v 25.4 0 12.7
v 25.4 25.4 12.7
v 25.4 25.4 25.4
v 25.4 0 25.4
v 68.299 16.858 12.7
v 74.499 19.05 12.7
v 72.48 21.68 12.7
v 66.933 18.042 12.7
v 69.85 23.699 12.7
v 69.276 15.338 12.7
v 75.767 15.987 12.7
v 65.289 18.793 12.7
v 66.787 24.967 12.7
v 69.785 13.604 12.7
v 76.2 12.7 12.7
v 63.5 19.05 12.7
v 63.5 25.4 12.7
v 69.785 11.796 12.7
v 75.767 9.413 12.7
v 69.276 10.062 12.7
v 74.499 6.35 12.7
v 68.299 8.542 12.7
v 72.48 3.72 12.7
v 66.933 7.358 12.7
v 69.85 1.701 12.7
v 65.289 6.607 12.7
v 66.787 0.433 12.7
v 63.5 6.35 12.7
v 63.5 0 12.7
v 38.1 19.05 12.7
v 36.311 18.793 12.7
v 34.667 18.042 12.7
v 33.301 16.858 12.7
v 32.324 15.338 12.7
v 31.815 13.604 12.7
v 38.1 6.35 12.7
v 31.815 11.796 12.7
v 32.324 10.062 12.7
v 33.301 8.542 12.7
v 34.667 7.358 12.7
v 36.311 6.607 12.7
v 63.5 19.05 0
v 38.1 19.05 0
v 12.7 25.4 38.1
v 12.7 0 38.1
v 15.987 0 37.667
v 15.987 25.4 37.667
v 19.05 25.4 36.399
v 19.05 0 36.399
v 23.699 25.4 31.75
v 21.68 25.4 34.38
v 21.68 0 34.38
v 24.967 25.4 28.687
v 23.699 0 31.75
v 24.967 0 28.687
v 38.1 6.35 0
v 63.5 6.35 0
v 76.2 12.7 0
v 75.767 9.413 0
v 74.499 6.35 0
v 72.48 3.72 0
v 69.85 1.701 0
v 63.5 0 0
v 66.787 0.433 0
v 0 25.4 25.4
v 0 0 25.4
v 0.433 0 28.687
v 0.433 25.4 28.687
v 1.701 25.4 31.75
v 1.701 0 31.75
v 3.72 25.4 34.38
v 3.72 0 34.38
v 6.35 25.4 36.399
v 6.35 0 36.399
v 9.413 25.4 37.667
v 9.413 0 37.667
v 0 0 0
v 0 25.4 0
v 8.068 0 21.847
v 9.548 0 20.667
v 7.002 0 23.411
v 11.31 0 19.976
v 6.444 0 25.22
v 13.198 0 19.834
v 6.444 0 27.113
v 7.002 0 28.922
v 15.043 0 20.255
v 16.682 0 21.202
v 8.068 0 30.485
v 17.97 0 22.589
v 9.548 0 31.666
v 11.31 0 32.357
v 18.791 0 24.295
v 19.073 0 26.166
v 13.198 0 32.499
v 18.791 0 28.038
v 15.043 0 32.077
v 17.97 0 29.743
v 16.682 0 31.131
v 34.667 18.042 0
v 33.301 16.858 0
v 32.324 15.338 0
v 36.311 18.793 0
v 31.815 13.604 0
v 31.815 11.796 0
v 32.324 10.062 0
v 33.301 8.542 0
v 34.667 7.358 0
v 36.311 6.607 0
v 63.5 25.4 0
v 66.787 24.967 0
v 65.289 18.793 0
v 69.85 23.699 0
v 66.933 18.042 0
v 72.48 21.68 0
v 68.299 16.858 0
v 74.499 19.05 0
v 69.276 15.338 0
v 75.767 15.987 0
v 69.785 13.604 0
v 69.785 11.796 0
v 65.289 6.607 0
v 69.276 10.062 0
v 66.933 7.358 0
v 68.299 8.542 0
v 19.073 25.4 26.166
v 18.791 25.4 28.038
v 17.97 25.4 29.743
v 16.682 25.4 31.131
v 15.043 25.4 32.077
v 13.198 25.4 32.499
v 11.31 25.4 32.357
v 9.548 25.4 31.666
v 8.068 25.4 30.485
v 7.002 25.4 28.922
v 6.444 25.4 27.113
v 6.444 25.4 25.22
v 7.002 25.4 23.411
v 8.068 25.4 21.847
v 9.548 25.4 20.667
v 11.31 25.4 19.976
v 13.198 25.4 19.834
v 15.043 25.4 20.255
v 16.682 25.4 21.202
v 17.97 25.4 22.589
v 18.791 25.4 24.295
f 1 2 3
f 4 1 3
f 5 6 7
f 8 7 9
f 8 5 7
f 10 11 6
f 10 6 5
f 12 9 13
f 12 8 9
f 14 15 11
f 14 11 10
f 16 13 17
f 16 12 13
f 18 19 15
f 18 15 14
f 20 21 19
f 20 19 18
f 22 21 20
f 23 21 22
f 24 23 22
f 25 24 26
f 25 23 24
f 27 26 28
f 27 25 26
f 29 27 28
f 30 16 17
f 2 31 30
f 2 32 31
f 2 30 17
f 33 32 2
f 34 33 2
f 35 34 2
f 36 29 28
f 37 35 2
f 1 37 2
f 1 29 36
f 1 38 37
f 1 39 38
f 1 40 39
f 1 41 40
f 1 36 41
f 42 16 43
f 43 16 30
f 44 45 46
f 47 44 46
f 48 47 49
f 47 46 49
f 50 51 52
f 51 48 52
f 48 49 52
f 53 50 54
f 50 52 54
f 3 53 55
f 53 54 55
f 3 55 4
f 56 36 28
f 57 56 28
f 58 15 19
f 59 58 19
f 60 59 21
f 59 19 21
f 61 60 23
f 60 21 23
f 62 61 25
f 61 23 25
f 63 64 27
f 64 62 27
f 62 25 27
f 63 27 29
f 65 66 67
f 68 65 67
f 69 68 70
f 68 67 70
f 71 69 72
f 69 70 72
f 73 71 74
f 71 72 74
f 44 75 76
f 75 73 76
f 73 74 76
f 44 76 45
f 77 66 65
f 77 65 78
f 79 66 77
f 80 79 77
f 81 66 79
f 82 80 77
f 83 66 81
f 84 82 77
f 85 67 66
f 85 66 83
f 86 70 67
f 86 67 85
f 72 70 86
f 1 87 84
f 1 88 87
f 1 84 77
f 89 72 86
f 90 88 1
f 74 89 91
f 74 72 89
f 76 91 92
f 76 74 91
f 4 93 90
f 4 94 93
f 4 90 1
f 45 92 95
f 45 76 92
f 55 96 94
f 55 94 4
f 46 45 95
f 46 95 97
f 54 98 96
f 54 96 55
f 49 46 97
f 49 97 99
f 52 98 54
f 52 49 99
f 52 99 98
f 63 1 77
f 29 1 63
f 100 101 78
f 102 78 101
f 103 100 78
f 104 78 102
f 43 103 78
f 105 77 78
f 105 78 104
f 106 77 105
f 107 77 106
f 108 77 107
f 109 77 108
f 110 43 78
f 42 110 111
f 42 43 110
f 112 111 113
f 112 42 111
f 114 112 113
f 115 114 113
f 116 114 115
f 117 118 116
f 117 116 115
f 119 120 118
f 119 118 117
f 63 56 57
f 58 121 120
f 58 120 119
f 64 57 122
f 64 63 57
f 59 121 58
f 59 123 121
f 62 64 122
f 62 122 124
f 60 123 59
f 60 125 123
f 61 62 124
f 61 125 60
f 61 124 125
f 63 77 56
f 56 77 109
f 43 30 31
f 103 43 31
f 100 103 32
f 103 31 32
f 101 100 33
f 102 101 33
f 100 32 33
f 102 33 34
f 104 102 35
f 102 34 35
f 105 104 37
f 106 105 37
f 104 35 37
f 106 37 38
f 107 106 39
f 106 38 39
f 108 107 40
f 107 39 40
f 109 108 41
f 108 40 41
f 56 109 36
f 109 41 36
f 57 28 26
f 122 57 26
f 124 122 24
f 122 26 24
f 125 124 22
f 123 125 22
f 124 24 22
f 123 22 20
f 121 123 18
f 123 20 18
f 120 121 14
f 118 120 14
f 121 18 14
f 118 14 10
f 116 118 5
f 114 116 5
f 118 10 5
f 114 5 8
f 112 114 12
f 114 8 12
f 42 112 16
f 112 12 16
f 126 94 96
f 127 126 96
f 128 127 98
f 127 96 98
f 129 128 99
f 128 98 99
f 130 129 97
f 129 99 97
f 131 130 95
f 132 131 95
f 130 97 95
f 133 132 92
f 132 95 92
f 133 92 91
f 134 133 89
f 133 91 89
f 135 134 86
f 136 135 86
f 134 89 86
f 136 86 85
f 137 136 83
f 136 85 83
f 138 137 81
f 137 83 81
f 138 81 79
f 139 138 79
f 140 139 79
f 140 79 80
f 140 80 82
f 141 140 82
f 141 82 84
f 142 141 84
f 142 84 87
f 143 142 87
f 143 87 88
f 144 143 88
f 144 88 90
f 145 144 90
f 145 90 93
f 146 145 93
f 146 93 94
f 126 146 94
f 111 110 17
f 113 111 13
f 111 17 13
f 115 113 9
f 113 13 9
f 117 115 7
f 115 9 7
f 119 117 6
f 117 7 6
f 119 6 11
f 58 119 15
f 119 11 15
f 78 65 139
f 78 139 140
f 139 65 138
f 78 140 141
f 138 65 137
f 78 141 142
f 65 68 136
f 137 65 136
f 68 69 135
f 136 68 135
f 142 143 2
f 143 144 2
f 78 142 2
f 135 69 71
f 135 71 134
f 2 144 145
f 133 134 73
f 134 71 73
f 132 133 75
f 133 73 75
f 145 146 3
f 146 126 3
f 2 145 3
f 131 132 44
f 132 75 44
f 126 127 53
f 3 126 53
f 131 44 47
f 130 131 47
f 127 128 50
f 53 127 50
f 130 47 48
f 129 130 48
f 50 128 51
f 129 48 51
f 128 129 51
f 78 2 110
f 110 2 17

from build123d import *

# Parameters (mm, degrees)
F1_DEPTH = 25.4
F2_R     = 6.35
F3_DEPTH = 52.07
F5_DEPTH = 48.768
F7_DEPTH = 25.4
F9_DEPTH = 25.4


with BuildPart() as f1:
    # F0 (on Front) → F1 (new body)
    with BuildSketch(Plane.XZ):
        Polygon((0, 38.1), (0, 0), (76.2, 0), (76.2, 12.7), (25.4, 12.7), (25.4, 38.1), align=None)
    extrude(amount=-F1_DEPTH)

    # F2 (on face) → F3 (cut)
    with BuildSketch(Plane.XZ):
        with Locations((12.7231444902, 26.1663774417)):
            Circle(F2_R)
    extrude(amount=-F3_DEPTH, mode=Mode.SUBTRACT)

    # F4 (on face) → F5 (cut)
    with BuildSketch(Plane.XZ):
        with BuildLine():
            ThreePointArc((12.7, 38.1), (21.6802561211, 34.3802561211), (25.4, 25.4))
            Line((25.4, 25.4), (25.4, 38.1))
            Line((25.4, 38.1), (12.7, 38.1))
        make_face()
        with BuildLine():
            ThreePointArc((0, 25.4), (3.7197438789, 34.3802561211), (12.7, 38.1))
            Line((12.7, 38.1), (0, 38.1))
            Line((0, 38.1), (0, 25.4))
        make_face()
    extrude(amount=-F5_DEPTH, mode=Mode.SUBTRACT)

    # F6 (on face) → F7 (cut)
    with BuildSketch(Plane.XY.offset(12.7)):
        with BuildLine():
            Line((63.5, 19.05), (38.1, 19.05))
            ThreePointArc((38.1, 19.05), (31.75, 12.7), (38.1, 6.35))
            Line((38.1, 6.35), (63.5, 6.35))
            ThreePointArc((63.5, 6.35), (69.85, 12.7), (63.5, 19.05))
        make_face()
    extrude(amount=-F7_DEPTH, mode=Mode.SUBTRACT)

    # F8 (on face) → F9 (cut)
    with BuildSketch(Plane.XY.offset(12.7)):
        with BuildLine():
            ThreePointArc((63.5, 25.4), (72.4802561211, 21.6802561211), (76.2, 12.7))
            Line((76.2, 12.7), (76.2, 25.4))
            Line((76.2, 25.4), (63.5, 25.4))
        make_face()
        with BuildLine():
            ThreePointArc((76.2, 12.7), (72.4802561211, 3.7197438789), (63.5, 0))
            Line((63.5, 0), (76.2, 0))
            Line((76.2, 0), (76.2, 12.7))
        make_face()
    extrude(amount=-F9_DEPTH, mode=Mode.SUBTRACT)


solid = f1.part
